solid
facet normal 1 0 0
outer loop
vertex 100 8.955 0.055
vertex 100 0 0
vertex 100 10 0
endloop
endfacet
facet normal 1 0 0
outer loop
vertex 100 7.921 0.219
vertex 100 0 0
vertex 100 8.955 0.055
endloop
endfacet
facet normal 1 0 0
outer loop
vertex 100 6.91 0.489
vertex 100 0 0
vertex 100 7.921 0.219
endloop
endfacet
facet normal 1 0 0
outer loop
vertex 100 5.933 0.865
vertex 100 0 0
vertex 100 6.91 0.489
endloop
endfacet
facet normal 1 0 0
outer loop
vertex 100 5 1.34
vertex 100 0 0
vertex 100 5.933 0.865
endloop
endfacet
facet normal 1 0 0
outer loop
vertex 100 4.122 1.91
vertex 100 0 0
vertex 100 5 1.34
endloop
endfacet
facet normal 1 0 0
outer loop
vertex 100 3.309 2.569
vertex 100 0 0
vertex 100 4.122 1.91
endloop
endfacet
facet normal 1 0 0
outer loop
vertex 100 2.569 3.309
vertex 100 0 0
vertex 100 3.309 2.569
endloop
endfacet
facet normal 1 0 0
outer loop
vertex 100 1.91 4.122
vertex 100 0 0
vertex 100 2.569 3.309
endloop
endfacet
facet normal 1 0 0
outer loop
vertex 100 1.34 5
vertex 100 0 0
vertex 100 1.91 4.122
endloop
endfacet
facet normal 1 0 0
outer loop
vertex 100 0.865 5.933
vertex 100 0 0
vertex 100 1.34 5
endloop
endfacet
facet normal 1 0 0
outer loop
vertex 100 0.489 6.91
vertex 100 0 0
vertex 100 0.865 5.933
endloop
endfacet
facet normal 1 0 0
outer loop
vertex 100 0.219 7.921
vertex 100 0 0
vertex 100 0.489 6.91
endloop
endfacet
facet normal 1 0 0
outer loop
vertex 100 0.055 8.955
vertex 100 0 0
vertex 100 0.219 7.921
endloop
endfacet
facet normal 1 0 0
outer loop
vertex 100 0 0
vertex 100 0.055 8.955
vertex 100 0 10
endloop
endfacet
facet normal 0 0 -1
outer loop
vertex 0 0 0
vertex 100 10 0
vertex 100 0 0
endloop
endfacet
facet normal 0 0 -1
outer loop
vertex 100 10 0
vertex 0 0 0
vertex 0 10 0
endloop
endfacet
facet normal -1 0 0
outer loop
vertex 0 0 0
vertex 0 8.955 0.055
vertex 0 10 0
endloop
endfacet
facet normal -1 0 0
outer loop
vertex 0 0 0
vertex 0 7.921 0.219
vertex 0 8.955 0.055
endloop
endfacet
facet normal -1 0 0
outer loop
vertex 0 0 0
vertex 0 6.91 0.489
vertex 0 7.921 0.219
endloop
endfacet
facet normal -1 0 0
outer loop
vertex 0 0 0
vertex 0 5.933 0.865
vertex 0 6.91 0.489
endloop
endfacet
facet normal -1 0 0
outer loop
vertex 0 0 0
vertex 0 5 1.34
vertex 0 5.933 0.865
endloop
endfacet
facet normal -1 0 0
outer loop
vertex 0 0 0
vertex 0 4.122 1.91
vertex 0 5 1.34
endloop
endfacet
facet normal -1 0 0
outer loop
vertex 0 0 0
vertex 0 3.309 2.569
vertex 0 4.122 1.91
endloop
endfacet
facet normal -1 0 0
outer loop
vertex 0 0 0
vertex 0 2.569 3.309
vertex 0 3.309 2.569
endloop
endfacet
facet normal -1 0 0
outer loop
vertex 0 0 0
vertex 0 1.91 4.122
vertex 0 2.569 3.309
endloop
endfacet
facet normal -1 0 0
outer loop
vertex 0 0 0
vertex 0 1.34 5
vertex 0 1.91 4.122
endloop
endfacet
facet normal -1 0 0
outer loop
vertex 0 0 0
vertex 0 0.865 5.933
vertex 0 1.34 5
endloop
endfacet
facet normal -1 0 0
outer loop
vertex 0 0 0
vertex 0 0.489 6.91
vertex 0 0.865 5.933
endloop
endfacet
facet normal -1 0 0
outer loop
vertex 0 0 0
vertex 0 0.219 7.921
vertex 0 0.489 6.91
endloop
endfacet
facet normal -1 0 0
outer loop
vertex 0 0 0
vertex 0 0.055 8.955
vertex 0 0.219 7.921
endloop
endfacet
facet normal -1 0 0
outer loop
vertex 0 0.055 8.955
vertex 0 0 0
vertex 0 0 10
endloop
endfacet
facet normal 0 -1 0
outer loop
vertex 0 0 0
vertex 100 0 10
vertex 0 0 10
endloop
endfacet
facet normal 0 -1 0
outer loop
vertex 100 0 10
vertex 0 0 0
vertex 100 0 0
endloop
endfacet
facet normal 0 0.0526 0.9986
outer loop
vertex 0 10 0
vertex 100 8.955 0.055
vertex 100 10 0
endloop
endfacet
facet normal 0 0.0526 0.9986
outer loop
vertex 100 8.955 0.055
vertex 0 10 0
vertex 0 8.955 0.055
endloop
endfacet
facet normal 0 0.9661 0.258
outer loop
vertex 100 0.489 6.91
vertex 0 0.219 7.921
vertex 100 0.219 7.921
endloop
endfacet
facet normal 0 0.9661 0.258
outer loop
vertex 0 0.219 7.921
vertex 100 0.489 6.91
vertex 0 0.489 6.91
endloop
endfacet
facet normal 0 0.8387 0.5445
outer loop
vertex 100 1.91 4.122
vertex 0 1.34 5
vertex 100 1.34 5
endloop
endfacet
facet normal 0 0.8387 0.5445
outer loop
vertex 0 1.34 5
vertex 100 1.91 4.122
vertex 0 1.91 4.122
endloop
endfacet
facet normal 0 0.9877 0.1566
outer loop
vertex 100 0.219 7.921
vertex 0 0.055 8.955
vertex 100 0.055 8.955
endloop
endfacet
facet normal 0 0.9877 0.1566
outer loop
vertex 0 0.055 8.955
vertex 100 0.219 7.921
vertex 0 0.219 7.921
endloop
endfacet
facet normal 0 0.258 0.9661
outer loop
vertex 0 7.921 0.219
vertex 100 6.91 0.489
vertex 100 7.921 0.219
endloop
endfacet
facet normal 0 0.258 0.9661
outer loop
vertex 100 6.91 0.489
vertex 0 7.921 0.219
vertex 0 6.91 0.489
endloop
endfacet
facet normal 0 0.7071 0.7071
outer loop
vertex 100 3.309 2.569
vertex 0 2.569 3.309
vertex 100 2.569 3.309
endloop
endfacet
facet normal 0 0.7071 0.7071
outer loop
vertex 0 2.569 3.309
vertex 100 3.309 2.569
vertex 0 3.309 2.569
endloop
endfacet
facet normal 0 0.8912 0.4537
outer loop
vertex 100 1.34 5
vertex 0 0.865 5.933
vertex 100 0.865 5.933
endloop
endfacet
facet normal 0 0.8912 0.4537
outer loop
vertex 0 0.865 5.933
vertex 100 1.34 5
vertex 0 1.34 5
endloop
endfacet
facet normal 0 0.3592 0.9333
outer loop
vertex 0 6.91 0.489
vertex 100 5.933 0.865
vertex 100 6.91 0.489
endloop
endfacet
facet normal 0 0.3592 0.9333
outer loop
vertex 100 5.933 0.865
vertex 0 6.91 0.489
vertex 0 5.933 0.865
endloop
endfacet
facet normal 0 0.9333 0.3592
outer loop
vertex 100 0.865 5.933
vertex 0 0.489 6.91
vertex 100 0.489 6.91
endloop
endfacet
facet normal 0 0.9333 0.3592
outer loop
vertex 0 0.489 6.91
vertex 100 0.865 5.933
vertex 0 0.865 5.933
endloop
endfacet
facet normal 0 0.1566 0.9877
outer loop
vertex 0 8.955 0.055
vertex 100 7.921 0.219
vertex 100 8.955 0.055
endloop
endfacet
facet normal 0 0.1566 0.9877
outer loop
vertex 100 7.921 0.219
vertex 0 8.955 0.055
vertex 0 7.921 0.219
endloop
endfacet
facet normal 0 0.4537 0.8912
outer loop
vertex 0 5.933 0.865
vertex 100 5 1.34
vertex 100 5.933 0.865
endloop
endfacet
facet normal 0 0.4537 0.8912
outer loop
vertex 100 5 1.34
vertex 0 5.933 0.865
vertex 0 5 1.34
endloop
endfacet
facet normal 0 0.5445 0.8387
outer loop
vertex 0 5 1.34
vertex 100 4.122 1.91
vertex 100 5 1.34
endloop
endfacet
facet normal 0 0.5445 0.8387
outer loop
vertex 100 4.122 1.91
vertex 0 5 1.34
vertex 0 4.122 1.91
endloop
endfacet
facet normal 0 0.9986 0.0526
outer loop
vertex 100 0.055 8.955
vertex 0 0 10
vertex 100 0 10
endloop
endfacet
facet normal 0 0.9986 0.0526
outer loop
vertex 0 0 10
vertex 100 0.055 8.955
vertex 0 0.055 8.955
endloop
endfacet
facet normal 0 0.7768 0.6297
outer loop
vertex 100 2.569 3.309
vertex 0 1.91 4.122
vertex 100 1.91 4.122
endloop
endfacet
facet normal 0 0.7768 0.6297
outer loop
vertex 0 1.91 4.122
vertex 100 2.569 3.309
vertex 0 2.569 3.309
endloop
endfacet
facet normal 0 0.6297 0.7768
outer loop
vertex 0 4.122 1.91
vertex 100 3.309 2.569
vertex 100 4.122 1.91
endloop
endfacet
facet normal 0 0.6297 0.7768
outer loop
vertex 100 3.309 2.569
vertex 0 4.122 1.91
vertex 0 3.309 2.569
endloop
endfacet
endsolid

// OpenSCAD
// =========================================================
// OpenSCAD Code: 100mm 圓柱體 (R=10) 沿 X 軸
// =========================================================

// 設定曲面平滑度
$fn = 60;

// --- 尺寸變數 ---
inner_fillet_cylinder_length = 100; // L=100 mm (將沿 X 軸)
inner_fillet_outer_radius = 10;     // R=10 mm

// 我們將使用 rotate() 將圓柱體從 Z 軸轉向 X 軸。
// 為了確保圓柱體的起點 (X=0) 位於世界座標的原點 [0, 0, 0]，
// 我們先讓圓柱體底部中心位於原點 (預設行為)，然後再旋轉。



translate(v = [0, 0, 0])
  difference() {
  //union() {

    translate(v = [0, 0, 0])
    {
        // 立方體從 Y=0 開始向正 Y 方向延伸，完美覆蓋圓柱體的上半部。
        cube(
            size = [inner_fillet_cylinder_length, inner_fillet_outer_radius, inner_fillet_outer_radius]
        );
    }

    translate(v = [0, inner_fillet_outer_radius, inner_fillet_outer_radius])
      rotate(a = 90, v = [0, 1, 0]) // 繞 Y 軸旋轉 90 度
      {
          // cylinder() 預設沿 Z 軸，底部中心在 [0, 0, 0]。
          // 旋轉後：
          // Z 軸 (高度) --> 變為 X 軸 (長度)
          // X, Y 軸 (半徑) --> 變為 Y, Z 軸 (半徑)
          cylinder(
              h = inner_fillet_cylinder_length,
              r = inner_fillet_outer_radius
          );
      }

  }
